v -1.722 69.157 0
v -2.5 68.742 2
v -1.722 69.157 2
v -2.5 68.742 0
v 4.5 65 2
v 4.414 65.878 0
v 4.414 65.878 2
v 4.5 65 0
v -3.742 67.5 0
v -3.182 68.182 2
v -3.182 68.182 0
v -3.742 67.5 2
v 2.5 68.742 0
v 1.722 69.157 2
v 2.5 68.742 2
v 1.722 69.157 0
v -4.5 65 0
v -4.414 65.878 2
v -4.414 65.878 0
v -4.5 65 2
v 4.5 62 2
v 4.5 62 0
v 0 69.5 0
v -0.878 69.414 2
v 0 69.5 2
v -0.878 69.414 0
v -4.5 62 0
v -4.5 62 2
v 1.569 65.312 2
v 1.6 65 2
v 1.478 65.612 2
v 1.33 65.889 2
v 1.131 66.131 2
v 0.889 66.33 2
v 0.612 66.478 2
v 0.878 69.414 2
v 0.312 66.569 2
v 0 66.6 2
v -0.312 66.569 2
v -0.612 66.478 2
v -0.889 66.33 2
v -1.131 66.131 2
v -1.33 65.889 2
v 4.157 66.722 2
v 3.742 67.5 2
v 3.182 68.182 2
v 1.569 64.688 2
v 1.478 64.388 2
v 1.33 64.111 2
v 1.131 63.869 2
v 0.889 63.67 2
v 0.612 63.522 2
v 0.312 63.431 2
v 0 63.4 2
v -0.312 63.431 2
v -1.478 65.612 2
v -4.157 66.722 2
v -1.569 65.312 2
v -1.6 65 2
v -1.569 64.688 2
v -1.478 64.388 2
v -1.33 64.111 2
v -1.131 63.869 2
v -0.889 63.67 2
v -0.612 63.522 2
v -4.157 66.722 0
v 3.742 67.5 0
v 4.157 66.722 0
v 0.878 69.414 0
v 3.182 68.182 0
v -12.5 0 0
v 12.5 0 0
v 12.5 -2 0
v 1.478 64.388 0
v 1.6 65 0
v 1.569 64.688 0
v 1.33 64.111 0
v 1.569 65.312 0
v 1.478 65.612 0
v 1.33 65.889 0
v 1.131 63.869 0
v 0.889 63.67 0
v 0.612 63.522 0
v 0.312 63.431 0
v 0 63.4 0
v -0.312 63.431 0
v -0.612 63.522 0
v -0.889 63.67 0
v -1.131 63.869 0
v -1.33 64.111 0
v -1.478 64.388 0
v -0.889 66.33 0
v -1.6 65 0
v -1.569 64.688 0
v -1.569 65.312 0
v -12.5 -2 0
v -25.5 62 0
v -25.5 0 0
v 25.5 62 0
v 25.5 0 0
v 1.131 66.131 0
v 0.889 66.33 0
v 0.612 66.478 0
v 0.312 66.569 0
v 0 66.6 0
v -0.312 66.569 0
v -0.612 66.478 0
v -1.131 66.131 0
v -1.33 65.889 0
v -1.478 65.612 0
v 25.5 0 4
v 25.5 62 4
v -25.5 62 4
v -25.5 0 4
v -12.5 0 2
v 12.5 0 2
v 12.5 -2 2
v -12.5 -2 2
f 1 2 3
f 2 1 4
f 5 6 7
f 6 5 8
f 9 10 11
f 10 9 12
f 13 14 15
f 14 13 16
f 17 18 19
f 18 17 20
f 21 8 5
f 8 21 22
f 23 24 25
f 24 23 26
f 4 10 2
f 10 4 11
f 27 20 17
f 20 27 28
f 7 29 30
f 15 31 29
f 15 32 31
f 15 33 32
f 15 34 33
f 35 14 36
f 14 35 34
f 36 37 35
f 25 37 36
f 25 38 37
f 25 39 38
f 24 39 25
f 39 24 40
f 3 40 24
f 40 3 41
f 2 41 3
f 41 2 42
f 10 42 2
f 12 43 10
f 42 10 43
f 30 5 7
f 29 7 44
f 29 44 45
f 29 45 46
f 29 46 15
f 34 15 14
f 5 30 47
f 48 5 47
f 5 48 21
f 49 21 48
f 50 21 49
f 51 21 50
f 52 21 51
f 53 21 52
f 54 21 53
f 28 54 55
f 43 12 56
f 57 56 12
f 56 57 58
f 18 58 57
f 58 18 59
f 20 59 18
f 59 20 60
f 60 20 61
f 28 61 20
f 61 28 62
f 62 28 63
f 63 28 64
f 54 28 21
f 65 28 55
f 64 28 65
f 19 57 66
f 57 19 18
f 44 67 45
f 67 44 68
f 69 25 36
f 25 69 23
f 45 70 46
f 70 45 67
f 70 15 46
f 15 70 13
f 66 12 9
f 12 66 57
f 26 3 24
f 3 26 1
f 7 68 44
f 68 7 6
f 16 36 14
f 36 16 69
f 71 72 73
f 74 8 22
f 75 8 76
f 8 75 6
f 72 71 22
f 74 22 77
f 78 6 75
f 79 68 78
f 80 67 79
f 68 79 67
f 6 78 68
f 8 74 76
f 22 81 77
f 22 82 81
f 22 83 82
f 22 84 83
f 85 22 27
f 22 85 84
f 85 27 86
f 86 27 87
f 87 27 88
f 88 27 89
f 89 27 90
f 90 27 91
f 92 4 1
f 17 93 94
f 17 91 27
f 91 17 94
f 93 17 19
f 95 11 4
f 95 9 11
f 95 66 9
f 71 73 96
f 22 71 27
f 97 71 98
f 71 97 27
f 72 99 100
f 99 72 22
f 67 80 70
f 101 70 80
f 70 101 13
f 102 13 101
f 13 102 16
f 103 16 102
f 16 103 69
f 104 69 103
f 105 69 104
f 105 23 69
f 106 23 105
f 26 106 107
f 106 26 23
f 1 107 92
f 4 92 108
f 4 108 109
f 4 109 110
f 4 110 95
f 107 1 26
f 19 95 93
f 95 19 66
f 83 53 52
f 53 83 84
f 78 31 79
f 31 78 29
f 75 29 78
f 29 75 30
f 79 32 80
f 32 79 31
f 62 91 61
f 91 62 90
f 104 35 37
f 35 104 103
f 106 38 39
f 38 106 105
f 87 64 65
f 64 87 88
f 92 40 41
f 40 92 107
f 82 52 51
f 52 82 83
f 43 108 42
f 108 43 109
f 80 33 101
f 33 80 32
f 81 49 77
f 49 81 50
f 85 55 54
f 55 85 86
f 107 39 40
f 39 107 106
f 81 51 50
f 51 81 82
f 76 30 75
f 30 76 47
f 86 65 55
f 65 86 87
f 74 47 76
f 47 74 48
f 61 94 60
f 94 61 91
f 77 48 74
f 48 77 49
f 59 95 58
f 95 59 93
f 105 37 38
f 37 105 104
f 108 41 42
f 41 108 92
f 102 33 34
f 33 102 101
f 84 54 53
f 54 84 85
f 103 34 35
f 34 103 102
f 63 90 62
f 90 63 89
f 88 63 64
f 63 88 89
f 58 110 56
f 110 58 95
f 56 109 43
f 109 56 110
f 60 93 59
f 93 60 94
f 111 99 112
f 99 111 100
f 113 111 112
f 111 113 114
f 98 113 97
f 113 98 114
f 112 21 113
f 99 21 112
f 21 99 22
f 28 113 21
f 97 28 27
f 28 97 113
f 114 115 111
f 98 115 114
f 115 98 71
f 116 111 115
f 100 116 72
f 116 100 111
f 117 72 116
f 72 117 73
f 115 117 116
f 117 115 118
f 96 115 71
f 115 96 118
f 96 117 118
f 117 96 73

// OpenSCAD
$fn=32;

L=62;
W=51;
H=4;
CUT_W=25;
CUT_DEPTH=2;
CUT_H=2;

HOLE_K=65;
HOLE_P_D=9;

translate([0,L/2,H/2])
cube([W,L,H],center=true);

difference() {
    hull() {
        translate([0,HOLE_K,H/4])
        cylinder(d=HOLE_P_D,h=H/2,center=true);
        translate([0,HOLE_K/2,H/4])
        cylinder(d=HOLE_P_D,h=H/2,center=true);
    }
    translate([0,HOLE_K,H/4])
    cylinder(d=3.2,h=H,center=true);
}

translate([0,0,CUT_H/2])
cube([CUT_W,CUT_DEPTH*2,CUT_H],center=true);
